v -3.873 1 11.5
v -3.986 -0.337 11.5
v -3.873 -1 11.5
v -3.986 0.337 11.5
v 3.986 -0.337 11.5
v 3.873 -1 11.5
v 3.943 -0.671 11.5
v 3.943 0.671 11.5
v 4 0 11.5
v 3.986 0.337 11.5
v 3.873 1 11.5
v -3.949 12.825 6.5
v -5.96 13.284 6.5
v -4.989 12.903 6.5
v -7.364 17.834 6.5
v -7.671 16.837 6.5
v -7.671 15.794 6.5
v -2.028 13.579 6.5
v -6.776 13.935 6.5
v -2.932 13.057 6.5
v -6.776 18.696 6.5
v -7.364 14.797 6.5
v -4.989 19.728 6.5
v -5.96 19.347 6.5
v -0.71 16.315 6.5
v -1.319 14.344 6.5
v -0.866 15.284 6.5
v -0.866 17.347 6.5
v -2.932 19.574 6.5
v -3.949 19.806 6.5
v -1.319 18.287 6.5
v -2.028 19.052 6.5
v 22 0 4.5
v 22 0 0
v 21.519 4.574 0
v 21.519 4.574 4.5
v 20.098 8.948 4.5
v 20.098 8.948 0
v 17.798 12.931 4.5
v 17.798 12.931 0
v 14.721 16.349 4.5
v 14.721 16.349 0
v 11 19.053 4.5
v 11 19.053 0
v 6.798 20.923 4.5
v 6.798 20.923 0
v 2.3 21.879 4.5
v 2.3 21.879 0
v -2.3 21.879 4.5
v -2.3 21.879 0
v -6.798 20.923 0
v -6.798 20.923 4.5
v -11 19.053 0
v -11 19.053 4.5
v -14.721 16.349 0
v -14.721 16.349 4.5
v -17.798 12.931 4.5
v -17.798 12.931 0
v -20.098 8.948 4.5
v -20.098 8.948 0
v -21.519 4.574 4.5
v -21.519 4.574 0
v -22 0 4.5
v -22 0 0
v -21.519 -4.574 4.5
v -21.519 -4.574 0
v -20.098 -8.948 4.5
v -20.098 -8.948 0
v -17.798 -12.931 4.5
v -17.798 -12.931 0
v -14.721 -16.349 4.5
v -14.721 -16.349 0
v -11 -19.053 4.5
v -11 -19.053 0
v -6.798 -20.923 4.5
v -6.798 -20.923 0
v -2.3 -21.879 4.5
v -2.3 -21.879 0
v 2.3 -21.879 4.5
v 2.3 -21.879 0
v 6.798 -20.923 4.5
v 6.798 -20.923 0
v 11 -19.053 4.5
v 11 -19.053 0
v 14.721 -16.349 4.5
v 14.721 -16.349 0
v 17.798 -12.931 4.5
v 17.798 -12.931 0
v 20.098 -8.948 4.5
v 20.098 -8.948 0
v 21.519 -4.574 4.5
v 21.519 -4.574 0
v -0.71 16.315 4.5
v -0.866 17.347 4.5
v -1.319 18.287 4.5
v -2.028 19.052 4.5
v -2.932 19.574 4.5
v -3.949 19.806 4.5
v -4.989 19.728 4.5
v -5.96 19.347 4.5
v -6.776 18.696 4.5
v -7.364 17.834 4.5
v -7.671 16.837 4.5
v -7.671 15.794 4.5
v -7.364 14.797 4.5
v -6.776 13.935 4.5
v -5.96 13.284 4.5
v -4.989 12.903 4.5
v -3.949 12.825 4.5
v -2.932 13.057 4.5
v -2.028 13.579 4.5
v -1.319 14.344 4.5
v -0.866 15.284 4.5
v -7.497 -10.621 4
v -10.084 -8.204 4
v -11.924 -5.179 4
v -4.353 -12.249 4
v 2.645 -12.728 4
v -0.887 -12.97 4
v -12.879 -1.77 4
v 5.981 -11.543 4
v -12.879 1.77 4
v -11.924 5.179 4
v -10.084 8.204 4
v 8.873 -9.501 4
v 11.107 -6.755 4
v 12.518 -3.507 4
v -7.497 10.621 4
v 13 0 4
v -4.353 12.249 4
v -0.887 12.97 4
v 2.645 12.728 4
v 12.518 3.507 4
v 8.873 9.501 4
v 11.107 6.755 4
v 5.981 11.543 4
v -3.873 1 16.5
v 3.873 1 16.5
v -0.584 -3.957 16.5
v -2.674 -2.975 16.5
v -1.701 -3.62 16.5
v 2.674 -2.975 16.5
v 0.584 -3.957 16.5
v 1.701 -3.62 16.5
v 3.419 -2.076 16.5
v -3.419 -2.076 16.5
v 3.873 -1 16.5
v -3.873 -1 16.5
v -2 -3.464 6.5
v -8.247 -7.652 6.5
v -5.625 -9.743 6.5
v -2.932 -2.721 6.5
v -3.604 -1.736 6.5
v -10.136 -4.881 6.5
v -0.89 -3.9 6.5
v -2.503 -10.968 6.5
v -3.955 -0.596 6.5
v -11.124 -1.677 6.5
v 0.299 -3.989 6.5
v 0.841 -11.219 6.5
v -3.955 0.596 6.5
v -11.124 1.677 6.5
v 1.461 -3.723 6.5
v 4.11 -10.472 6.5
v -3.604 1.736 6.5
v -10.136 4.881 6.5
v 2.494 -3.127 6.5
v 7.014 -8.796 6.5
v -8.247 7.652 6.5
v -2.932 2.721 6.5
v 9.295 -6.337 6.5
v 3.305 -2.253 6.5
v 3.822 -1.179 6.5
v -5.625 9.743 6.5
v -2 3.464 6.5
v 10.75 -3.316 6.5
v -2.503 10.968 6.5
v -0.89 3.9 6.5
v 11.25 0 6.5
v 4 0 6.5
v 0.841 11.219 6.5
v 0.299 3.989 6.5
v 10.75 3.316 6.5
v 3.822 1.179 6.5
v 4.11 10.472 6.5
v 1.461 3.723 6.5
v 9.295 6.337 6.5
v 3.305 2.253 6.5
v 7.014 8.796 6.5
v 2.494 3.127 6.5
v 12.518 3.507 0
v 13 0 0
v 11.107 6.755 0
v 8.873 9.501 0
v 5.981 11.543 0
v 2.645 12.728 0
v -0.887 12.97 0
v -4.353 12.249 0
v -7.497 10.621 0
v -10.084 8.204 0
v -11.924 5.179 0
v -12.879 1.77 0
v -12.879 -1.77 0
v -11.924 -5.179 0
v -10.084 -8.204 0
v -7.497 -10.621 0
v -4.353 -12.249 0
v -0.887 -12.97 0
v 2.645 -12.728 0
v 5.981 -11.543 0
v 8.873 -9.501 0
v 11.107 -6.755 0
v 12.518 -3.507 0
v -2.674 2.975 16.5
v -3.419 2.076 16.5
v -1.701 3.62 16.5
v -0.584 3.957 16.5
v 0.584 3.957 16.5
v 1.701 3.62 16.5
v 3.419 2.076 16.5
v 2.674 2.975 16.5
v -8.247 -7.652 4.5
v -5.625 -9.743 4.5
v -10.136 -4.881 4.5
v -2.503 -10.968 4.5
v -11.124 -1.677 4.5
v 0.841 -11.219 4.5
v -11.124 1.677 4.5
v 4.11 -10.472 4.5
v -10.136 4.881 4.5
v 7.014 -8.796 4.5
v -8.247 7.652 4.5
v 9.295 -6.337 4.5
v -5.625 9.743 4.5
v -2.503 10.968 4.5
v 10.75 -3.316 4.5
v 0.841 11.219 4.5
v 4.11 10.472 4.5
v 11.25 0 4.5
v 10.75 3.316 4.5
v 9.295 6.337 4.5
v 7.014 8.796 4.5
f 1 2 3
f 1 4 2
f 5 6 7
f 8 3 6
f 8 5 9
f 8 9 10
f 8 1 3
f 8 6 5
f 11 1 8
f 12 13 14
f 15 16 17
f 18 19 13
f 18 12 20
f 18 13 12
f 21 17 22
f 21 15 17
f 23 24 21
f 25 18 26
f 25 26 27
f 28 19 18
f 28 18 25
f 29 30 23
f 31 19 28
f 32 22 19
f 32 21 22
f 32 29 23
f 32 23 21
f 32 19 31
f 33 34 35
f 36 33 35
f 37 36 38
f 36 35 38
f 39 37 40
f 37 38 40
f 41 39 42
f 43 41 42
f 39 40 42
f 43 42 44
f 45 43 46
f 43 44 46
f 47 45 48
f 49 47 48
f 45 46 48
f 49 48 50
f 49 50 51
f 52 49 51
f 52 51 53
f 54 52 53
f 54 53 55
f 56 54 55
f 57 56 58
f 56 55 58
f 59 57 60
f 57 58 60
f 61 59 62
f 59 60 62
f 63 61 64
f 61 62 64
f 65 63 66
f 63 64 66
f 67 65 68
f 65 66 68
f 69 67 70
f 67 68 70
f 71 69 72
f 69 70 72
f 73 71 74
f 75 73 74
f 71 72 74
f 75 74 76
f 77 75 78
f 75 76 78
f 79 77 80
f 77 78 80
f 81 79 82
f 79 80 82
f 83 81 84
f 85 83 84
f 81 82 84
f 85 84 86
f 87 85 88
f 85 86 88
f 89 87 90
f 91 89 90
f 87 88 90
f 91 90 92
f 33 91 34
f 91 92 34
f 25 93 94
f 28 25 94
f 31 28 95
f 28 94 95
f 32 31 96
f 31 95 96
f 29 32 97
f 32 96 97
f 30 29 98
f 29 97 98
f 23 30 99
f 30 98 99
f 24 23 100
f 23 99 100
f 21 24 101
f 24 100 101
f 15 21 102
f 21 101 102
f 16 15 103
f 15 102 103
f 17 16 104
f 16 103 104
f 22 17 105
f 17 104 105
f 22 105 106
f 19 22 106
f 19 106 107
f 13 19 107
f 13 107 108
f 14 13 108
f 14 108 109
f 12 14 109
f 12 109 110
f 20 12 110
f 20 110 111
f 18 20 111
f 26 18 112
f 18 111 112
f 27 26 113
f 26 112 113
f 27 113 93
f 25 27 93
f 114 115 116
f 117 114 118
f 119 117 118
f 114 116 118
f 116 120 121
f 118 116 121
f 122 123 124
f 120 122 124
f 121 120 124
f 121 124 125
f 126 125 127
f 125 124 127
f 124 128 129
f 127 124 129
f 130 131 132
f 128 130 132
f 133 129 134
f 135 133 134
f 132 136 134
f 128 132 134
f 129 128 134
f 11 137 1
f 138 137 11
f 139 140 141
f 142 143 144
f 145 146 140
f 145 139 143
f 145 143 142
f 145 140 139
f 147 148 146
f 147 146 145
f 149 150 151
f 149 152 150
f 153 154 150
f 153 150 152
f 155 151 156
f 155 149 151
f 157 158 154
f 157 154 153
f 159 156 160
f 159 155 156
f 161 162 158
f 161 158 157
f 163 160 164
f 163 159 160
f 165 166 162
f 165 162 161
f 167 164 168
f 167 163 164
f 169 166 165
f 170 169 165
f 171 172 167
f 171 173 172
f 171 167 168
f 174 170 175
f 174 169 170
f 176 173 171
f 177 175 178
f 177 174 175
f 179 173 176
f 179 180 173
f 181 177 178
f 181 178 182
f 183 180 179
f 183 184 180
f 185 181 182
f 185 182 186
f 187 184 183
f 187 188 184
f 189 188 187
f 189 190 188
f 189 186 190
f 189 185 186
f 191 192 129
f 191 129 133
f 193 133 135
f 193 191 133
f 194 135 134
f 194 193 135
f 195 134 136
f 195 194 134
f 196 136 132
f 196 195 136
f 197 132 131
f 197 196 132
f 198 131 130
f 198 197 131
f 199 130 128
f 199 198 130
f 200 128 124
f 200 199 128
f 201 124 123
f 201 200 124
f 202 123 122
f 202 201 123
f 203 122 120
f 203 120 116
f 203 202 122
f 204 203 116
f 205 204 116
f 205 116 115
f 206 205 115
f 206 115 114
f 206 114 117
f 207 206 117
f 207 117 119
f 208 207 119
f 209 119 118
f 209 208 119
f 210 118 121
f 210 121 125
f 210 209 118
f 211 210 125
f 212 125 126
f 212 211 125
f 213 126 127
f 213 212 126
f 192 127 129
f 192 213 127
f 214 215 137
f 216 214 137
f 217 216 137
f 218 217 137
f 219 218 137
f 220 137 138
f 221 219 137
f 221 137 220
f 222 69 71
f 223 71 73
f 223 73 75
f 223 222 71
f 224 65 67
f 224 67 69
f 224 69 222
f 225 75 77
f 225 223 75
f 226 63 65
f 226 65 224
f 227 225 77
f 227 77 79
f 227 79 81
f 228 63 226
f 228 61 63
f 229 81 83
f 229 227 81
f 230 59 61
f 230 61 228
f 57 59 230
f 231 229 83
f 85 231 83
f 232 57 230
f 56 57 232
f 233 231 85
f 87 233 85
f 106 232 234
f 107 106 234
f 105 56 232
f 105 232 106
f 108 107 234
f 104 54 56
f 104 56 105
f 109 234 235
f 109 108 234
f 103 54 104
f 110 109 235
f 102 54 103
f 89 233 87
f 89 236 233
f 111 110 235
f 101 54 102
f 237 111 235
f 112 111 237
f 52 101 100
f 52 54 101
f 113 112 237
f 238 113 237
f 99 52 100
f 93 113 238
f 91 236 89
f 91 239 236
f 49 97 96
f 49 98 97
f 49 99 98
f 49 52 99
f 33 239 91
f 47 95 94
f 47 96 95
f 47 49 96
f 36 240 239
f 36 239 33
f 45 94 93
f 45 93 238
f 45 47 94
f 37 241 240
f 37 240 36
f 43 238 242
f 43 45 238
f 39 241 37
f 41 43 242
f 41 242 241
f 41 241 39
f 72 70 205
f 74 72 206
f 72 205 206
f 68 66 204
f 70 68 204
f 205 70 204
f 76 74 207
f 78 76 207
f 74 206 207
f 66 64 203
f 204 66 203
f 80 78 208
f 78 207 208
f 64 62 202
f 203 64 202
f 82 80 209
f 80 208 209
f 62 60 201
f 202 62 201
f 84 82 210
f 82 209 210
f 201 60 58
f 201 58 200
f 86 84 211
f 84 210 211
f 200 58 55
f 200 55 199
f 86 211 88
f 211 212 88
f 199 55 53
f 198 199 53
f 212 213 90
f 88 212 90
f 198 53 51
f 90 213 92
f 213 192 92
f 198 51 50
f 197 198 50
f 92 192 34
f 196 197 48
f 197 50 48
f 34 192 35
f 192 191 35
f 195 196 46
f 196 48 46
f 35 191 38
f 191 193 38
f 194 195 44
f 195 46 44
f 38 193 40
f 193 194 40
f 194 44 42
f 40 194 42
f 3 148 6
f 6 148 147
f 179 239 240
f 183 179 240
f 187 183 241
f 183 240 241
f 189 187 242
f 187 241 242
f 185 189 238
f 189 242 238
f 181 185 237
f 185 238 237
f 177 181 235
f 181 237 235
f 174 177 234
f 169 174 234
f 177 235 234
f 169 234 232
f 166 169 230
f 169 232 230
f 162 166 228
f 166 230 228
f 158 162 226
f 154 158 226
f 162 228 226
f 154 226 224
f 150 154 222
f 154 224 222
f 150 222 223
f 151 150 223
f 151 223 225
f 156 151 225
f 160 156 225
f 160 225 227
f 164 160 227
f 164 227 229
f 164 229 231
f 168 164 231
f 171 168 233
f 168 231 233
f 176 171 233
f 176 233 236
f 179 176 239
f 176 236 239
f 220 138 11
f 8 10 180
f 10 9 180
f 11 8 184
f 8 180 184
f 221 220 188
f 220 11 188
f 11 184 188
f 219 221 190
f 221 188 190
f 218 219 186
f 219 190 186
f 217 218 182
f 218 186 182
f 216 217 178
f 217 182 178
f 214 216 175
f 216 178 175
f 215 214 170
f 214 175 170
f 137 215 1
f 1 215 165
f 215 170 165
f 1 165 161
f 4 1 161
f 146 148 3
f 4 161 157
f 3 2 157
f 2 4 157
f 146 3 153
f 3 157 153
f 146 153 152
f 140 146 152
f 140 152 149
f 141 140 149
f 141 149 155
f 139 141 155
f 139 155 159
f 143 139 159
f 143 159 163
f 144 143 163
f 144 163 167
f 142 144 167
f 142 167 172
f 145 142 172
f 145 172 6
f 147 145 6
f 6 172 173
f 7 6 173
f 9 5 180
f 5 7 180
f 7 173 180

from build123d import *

# Parameters (mm, degrees)
SKETCH1_R           = 22
BOSS_EXTRUDE1_DEPTH = 4.5
BOSS_EXTRUDE2_START = 4.5
SKETCH2_R           = 11.25
BOSS_EXTRUDE2_DEPTH = 2
BOSS_EXTRUDE3_START = 4.5
SKETCH3_R           = 3.5
BOSS_EXTRUDE3_DEPTH = 2
BOSS_EXTRUDE4_START = 6.5
SKETCH4_R           = 4
BOSS_EXTRUDE4_DEPTH = 10
CUT_EXTRUDE1_START  = 16.5
SKETCH5_W           = 54.287880581
SKETCH5_H           = 2
CUT_EXTRUDE1_DEPTH  = 5
SKETCH6_R           = 13
CUT_EXTRUDE2_DEPTH  = 4


with BuildPart() as part:
    # Sketch1 → Boss-Extrude1 (new body)
    with BuildSketch(Plane.XY):
        Circle(SKETCH1_R)
    extrude(amount=BOSS_EXTRUDE1_DEPTH)

    # Sketch2 → Boss-Extrude2 (add)
    with BuildSketch(Plane.XY.offset(BOSS_EXTRUDE2_START)):
        Circle(SKETCH2_R)
    extrude(amount=BOSS_EXTRUDE2_DEPTH)

    # Sketch3 → Boss-Extrude3 (add)
    with BuildSketch(Plane.XY.offset(BOSS_EXTRUDE3_START)):
        with Locations((-4.210444621, 16.315472905)):
            Circle(SKETCH3_R)
    extrude(amount=BOSS_EXTRUDE3_DEPTH)

    # Sketch4 → Boss-Extrude4 (add)
    with BuildSketch(Plane.XY.offset(BOSS_EXTRUDE4_START)):
        Circle(SKETCH4_R)
    extrude(amount=BOSS_EXTRUDE4_DEPTH)

    # Sketch5 → Cut-Extrude1 (cut)
    with BuildSketch(Plane.XY.offset(CUT_EXTRUDE1_START)):
        with Locations((2.276588541, 0)):
            Rectangle(SKETCH5_W, SKETCH5_H)
    extrude(amount=-CUT_EXTRUDE1_DEPTH, mode=Mode.SUBTRACT)

    # Sketch6 → Cut-Extrude2 (cut)
    with BuildSketch(Plane.XY):
        Circle(SKETCH6_R)
    extrude(amount=CUT_EXTRUDE2_DEPTH, mode=Mode.SUBTRACT)


solid = part.part
